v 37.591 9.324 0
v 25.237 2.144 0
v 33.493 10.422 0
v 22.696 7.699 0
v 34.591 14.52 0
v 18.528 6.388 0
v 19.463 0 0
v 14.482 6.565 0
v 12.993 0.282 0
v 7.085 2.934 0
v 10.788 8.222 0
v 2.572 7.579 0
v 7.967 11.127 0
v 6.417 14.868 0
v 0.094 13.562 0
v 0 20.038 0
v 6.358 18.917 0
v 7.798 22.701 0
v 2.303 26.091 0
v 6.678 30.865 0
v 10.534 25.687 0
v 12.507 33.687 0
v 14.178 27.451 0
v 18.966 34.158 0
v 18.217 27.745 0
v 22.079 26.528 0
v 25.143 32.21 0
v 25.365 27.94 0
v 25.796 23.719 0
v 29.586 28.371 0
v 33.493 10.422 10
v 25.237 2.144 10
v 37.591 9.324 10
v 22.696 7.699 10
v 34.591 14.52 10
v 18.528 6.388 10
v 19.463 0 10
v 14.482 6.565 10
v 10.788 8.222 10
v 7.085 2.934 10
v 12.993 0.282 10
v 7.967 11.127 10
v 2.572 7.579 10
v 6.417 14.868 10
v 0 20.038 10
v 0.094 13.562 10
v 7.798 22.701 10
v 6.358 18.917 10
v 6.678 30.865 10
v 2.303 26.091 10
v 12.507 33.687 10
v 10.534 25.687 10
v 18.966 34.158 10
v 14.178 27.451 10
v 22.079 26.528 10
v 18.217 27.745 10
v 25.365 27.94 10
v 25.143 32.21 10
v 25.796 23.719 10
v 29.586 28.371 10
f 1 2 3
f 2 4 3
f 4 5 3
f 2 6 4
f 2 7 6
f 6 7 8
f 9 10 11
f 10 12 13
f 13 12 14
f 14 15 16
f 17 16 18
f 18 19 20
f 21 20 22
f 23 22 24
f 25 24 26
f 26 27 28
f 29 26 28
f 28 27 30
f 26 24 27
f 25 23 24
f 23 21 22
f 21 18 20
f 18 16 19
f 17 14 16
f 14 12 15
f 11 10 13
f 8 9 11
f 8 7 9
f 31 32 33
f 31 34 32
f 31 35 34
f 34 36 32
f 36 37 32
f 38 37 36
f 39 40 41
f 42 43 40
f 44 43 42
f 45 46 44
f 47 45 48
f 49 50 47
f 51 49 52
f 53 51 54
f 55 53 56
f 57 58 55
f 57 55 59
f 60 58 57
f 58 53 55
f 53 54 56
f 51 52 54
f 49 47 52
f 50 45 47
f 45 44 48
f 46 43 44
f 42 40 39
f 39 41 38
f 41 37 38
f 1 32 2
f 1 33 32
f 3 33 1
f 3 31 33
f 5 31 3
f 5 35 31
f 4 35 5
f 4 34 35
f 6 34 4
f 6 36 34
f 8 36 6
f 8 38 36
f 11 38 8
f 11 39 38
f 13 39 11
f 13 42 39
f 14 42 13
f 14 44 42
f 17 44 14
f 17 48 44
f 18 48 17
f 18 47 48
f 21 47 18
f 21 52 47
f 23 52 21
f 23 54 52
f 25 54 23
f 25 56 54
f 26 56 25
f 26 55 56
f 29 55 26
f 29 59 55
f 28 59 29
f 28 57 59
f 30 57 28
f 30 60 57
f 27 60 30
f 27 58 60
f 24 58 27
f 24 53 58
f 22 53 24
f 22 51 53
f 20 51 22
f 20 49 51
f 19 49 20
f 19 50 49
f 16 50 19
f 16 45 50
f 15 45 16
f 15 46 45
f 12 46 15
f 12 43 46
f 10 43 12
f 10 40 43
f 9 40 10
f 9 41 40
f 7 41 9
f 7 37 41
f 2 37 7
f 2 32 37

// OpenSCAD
$fn = 32;

// ----------------------------------------------------------------------
// Eye lug: ring_tail, 10 mm thick
// ----------------------------------------------------------------------

// --- parameters (mm) ---
profile_height = 10;      // extrusion height
profile_points = 30;      // points of the closed outline

profile = [[25.365, 27.94], [29.586, 28.371], [25.143, 32.21], [18.966, 34.158], [12.507, 33.687], [6.678, 30.865], [2.303, 26.091], [0, 20.038], [0.094, 13.562], [2.572, 7.579], [7.085, 2.934], [12.993, 0.282], [19.463, 0], [25.237, 2.144], [37.591, 9.324], [33.493, 10.422], [34.591, 14.52], [22.696, 7.699], [18.528, 6.388], [14.482, 6.565], [10.788, 8.222], [7.967, 11.127], [6.417, 14.868], [6.358, 18.917], [7.798, 22.701], [10.534, 25.687], [14.178, 27.451], [18.217, 27.745], [22.079, 26.528], [25.796, 23.719]];  // single closed polygon, 30 points, counter clockwise

// --- the one profile operation ---
linear_extrude(height = profile_height) polygon(points = profile);
